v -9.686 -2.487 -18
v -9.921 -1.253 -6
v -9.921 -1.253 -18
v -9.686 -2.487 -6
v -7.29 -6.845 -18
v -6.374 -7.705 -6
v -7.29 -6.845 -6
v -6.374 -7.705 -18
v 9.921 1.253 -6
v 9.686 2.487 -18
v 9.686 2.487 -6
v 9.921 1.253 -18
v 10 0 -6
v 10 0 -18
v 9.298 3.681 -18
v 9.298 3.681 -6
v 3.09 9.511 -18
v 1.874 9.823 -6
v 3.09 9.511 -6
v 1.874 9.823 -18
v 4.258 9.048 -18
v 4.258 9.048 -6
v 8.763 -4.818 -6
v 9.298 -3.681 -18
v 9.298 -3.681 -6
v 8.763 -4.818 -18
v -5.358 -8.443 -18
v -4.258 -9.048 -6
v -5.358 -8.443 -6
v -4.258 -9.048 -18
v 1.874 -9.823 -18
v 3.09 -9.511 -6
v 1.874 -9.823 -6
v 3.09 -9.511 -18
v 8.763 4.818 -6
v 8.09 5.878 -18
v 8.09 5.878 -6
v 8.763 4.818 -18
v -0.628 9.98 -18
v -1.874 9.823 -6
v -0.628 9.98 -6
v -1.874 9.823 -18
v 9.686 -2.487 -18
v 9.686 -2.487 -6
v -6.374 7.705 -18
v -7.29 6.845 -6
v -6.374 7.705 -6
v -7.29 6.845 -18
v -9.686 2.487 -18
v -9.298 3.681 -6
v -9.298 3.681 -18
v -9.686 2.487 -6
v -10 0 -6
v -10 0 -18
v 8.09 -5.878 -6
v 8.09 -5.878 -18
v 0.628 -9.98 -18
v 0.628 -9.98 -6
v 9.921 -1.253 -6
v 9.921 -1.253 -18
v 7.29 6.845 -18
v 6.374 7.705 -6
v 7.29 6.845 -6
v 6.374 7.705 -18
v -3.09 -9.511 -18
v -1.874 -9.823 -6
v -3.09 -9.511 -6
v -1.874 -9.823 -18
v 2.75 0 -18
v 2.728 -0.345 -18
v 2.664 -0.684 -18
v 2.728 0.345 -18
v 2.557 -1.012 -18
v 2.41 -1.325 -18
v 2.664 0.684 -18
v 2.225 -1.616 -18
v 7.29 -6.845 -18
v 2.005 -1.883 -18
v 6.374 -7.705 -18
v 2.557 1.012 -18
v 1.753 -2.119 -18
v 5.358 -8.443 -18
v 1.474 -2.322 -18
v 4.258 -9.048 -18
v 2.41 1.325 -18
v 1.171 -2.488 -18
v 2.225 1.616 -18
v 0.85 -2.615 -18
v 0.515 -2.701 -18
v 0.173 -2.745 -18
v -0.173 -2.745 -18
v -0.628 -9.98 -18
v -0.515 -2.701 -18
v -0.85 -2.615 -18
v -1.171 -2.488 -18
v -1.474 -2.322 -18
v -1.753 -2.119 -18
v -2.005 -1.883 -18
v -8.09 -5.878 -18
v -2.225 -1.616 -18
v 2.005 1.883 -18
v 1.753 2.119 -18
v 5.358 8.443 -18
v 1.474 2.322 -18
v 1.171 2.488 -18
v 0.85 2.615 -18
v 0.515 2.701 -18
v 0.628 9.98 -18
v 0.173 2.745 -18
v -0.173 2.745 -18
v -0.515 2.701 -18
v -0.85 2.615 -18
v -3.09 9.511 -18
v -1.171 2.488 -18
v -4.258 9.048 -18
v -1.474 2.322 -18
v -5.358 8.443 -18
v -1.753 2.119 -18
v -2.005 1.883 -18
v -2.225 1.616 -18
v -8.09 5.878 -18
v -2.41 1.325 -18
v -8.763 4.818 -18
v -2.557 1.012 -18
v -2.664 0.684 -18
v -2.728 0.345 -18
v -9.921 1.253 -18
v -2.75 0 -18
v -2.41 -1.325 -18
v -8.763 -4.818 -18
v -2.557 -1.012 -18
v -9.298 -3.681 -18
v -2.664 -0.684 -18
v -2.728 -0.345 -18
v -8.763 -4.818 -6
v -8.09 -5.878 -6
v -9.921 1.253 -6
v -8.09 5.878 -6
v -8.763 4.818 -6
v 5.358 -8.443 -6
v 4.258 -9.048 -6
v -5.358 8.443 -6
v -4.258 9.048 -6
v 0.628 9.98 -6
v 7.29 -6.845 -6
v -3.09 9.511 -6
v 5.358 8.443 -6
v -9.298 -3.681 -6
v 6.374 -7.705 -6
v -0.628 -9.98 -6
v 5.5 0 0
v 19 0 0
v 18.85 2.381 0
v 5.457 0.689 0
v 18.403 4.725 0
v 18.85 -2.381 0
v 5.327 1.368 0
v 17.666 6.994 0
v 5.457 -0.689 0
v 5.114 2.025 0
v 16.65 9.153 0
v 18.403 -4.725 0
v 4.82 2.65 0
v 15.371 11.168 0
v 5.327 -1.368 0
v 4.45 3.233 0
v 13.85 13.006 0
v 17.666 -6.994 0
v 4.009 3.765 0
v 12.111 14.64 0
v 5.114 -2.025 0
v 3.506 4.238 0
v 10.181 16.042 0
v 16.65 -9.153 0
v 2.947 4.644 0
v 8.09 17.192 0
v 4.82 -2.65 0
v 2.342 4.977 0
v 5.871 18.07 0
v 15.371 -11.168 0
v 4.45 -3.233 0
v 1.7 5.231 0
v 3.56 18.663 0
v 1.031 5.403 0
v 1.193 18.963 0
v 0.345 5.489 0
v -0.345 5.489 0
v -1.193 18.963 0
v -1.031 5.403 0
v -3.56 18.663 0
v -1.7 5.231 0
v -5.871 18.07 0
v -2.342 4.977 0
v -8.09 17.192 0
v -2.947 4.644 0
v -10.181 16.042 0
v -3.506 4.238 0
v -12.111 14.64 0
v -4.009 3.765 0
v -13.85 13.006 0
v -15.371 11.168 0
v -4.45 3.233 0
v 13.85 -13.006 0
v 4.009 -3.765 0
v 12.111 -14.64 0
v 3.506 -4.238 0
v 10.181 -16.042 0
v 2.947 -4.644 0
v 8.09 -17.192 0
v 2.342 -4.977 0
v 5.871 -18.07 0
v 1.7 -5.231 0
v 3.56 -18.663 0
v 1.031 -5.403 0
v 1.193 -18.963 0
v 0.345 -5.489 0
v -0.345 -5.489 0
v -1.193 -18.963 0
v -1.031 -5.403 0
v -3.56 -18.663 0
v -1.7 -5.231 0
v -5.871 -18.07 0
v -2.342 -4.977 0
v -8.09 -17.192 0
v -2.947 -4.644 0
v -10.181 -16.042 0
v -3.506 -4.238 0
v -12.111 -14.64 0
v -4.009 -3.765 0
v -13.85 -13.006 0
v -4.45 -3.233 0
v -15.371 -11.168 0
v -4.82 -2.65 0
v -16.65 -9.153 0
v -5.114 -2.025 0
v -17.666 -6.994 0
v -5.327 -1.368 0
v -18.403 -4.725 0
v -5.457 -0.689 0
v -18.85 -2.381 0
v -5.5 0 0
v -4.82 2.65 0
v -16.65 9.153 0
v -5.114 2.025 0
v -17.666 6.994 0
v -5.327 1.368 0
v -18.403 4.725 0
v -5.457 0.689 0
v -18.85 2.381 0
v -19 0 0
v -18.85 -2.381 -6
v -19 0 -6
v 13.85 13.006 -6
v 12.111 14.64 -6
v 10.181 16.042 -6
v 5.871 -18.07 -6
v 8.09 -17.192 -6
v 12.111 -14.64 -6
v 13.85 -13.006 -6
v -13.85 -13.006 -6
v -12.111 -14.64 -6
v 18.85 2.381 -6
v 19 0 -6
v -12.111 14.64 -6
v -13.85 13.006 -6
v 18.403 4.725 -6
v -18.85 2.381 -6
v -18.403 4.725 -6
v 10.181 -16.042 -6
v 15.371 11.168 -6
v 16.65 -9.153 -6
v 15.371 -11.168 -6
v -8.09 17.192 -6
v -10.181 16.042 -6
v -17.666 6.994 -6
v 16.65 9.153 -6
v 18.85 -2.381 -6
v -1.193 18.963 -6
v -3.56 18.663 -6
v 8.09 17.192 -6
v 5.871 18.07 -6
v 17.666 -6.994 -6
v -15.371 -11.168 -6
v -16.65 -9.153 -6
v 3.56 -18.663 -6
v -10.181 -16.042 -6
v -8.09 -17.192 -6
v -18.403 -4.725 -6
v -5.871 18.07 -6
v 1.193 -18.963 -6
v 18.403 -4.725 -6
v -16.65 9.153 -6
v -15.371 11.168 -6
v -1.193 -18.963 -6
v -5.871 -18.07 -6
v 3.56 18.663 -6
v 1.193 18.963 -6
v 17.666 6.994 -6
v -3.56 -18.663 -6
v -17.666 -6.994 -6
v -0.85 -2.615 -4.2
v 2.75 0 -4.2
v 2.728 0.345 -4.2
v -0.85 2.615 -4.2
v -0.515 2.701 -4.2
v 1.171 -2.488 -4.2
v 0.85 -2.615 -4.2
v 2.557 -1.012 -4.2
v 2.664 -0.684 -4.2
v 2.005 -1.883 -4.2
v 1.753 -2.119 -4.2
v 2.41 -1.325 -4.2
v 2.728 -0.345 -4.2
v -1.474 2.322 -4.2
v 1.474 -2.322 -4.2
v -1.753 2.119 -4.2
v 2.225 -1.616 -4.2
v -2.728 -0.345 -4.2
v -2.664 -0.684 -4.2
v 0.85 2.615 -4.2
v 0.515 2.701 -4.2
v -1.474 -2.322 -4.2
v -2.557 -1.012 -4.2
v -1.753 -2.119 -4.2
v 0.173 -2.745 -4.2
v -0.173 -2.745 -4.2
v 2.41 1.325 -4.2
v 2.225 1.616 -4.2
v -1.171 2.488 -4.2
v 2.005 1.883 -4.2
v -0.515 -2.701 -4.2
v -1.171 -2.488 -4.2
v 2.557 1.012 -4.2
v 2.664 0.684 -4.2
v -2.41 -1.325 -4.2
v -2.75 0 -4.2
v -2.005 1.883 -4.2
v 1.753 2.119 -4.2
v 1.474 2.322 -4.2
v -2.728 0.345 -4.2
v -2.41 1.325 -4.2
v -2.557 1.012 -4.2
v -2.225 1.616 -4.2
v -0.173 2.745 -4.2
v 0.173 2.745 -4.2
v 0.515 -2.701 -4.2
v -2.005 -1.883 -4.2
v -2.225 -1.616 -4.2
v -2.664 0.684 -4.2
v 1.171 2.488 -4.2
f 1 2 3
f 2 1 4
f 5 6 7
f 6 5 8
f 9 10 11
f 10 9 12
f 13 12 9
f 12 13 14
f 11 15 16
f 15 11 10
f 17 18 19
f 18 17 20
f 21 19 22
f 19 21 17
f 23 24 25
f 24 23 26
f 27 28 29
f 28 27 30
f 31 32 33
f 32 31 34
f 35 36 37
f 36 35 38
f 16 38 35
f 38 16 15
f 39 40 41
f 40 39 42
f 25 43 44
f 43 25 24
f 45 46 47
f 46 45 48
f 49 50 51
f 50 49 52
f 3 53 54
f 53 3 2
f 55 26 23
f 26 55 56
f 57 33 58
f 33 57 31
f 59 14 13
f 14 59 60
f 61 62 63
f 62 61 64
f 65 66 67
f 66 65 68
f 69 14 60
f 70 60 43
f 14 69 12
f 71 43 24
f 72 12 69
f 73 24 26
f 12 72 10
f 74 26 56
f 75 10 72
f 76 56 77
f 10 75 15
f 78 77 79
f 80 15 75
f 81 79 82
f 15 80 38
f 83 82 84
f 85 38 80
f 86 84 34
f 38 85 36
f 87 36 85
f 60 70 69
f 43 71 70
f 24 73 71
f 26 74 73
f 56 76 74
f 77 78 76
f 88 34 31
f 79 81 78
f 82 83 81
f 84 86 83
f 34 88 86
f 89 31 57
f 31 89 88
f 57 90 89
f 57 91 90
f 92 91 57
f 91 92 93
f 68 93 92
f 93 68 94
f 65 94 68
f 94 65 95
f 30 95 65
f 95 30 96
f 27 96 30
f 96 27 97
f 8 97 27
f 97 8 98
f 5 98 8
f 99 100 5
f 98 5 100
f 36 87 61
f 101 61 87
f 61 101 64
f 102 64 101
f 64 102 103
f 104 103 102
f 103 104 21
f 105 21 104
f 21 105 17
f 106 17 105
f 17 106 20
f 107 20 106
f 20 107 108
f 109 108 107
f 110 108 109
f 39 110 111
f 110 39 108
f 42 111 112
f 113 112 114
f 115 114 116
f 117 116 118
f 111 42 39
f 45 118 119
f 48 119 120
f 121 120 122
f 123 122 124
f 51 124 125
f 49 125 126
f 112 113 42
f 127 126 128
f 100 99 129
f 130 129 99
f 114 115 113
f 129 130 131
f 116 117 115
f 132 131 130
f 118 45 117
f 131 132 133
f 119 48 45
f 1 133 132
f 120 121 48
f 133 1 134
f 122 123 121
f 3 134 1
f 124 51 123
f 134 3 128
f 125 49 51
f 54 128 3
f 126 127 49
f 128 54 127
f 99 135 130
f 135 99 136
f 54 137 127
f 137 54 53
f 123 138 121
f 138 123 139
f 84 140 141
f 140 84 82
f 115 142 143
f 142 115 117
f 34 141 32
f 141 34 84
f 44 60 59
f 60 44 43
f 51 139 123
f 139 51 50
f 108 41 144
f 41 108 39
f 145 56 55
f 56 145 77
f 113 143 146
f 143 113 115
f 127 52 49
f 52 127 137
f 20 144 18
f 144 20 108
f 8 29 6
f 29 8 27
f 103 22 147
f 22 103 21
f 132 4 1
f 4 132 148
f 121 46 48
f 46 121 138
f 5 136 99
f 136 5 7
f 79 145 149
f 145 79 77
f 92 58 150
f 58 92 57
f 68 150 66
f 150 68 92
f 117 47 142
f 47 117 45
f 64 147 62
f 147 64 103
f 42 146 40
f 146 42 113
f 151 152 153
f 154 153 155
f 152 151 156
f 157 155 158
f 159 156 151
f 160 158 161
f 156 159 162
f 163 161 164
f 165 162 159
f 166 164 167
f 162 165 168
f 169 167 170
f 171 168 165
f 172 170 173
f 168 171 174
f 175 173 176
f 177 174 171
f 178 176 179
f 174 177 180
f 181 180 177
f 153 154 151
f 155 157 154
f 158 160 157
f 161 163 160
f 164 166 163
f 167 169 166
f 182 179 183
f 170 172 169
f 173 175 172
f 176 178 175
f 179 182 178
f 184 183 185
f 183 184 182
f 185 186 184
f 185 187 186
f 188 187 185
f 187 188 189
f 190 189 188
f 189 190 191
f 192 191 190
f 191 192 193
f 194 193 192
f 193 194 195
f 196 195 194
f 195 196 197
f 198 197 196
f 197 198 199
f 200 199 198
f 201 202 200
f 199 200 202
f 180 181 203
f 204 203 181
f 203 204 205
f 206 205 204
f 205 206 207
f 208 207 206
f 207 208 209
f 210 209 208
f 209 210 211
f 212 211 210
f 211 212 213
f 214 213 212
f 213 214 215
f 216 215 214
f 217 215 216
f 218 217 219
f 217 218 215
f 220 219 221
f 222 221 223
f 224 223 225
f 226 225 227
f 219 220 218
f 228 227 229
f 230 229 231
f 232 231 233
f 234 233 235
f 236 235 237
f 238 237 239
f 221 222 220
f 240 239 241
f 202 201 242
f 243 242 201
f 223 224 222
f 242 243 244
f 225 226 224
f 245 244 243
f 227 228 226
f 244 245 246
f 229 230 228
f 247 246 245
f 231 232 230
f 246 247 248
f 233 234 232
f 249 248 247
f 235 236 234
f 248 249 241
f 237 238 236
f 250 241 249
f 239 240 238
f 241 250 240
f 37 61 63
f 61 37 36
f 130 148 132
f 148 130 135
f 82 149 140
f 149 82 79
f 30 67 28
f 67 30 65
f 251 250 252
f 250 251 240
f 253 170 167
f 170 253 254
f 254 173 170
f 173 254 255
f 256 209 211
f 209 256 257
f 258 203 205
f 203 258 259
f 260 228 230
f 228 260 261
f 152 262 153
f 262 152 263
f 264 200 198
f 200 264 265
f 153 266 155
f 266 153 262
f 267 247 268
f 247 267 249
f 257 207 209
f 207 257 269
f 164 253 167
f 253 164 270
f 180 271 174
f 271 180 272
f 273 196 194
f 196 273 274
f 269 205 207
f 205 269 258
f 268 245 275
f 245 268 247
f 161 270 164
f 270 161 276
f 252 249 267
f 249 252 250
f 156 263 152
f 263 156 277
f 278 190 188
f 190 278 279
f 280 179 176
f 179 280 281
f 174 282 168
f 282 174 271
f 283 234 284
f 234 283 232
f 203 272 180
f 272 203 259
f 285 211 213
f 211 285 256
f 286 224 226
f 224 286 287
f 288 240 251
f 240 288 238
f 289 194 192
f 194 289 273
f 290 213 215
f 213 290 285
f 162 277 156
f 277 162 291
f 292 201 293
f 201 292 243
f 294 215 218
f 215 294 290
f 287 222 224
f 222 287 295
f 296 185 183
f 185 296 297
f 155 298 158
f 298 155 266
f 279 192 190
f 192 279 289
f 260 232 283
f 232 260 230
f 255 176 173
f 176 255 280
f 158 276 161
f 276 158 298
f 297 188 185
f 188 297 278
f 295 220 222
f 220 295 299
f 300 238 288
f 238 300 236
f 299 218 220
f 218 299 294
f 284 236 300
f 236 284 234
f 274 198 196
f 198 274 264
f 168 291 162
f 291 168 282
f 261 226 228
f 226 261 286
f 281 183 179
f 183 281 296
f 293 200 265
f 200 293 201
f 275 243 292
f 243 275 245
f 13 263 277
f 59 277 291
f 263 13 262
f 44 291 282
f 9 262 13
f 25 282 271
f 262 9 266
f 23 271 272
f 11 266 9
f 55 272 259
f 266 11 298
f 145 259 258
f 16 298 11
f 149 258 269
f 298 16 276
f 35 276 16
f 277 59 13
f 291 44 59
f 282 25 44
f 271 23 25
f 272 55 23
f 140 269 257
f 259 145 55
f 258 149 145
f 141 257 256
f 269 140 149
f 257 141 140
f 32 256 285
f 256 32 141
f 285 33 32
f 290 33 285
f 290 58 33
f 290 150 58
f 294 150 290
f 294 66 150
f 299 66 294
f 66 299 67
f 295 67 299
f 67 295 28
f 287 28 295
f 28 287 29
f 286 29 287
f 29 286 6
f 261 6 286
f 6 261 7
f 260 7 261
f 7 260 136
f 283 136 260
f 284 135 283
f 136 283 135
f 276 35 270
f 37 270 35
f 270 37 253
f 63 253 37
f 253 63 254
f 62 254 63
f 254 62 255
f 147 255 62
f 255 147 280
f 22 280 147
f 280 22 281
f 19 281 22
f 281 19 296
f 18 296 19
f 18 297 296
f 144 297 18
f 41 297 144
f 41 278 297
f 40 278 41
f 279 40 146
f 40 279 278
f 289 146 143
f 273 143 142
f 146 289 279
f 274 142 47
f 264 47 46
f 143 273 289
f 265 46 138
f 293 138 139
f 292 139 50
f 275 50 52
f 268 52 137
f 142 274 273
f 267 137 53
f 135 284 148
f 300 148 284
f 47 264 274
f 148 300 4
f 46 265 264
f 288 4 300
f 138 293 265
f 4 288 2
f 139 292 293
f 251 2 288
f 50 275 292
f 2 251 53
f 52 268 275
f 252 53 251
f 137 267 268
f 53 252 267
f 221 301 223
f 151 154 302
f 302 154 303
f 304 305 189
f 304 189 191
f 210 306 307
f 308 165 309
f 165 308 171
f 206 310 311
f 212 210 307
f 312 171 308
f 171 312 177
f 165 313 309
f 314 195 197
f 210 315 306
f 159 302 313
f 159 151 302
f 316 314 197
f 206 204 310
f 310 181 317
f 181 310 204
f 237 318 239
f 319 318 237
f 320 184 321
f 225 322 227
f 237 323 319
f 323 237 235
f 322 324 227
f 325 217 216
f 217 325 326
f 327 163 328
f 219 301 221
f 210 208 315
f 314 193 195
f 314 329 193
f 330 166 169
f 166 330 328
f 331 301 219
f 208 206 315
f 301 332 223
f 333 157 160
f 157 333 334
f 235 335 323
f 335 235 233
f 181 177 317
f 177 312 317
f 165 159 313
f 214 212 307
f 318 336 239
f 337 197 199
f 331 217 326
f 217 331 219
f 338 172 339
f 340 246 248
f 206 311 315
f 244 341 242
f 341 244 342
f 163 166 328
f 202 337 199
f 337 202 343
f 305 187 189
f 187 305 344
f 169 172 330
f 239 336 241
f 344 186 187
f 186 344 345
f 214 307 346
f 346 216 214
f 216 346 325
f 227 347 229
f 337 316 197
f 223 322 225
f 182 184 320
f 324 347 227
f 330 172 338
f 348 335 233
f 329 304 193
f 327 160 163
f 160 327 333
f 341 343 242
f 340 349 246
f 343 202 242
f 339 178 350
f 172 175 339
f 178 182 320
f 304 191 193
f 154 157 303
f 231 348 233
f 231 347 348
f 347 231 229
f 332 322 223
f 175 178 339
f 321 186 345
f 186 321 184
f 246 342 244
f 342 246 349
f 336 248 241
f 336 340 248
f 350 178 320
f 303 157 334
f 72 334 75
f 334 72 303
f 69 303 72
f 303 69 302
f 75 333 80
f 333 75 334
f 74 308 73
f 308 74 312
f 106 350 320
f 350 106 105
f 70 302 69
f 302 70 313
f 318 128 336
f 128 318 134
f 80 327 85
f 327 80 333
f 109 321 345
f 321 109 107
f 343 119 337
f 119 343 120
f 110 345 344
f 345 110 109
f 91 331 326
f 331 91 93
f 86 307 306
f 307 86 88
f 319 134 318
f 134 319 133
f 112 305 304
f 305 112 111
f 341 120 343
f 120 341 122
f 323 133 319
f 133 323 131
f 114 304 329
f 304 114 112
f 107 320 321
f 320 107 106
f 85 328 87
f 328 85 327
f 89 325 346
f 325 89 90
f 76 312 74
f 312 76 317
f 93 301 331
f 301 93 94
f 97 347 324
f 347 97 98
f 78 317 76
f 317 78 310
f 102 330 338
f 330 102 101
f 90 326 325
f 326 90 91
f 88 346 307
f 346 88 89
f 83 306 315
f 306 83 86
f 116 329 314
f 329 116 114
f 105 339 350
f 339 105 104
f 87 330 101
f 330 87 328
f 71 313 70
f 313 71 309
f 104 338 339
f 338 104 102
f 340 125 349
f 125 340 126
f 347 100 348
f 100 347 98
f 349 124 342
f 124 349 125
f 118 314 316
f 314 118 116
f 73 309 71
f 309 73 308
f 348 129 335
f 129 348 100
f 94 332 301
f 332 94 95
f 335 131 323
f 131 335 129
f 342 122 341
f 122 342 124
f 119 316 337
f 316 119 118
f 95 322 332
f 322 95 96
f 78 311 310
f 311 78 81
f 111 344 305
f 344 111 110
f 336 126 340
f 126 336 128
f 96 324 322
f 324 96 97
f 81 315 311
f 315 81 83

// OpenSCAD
$fn = 50;


difference() {
	union() {
		translate(v = [0, 0, -18.0000000000]) {
			cylinder(h = 18, r = 10.0000000000);
		}
		translate(v = [0, 0, -6.0000000000]) {
			cylinder(h = 6, r = 19.0000000000);
		}
	}
	union() {
		translate(v = [0, 0, 0]) {
			rotate(a = [0, 0, 0]) {
				difference() {
					union() {
						#translate(v = [0, 0, -18.0000000000]) {
							cylinder(h = 18, r = 2.2500000000);
						}
						#translate(v = [0, 0, -4.2000000000]) {
							cylinder(h = 4.2000000000, r = 10.0000000000, r1 = 2.7500000000, r2 = 5.5000000000);
						}
						#translate(v = [0, 0, -18.0000000000]) {
							cylinder(h = 18, r = 2.7500000000);
						}
						#translate(v = [0, 0, -18.0000000000]) {
							cylinder(h = 18, r = 2.2500000000);
						}
					}
					union();
				}
			}
		}
	}
}
